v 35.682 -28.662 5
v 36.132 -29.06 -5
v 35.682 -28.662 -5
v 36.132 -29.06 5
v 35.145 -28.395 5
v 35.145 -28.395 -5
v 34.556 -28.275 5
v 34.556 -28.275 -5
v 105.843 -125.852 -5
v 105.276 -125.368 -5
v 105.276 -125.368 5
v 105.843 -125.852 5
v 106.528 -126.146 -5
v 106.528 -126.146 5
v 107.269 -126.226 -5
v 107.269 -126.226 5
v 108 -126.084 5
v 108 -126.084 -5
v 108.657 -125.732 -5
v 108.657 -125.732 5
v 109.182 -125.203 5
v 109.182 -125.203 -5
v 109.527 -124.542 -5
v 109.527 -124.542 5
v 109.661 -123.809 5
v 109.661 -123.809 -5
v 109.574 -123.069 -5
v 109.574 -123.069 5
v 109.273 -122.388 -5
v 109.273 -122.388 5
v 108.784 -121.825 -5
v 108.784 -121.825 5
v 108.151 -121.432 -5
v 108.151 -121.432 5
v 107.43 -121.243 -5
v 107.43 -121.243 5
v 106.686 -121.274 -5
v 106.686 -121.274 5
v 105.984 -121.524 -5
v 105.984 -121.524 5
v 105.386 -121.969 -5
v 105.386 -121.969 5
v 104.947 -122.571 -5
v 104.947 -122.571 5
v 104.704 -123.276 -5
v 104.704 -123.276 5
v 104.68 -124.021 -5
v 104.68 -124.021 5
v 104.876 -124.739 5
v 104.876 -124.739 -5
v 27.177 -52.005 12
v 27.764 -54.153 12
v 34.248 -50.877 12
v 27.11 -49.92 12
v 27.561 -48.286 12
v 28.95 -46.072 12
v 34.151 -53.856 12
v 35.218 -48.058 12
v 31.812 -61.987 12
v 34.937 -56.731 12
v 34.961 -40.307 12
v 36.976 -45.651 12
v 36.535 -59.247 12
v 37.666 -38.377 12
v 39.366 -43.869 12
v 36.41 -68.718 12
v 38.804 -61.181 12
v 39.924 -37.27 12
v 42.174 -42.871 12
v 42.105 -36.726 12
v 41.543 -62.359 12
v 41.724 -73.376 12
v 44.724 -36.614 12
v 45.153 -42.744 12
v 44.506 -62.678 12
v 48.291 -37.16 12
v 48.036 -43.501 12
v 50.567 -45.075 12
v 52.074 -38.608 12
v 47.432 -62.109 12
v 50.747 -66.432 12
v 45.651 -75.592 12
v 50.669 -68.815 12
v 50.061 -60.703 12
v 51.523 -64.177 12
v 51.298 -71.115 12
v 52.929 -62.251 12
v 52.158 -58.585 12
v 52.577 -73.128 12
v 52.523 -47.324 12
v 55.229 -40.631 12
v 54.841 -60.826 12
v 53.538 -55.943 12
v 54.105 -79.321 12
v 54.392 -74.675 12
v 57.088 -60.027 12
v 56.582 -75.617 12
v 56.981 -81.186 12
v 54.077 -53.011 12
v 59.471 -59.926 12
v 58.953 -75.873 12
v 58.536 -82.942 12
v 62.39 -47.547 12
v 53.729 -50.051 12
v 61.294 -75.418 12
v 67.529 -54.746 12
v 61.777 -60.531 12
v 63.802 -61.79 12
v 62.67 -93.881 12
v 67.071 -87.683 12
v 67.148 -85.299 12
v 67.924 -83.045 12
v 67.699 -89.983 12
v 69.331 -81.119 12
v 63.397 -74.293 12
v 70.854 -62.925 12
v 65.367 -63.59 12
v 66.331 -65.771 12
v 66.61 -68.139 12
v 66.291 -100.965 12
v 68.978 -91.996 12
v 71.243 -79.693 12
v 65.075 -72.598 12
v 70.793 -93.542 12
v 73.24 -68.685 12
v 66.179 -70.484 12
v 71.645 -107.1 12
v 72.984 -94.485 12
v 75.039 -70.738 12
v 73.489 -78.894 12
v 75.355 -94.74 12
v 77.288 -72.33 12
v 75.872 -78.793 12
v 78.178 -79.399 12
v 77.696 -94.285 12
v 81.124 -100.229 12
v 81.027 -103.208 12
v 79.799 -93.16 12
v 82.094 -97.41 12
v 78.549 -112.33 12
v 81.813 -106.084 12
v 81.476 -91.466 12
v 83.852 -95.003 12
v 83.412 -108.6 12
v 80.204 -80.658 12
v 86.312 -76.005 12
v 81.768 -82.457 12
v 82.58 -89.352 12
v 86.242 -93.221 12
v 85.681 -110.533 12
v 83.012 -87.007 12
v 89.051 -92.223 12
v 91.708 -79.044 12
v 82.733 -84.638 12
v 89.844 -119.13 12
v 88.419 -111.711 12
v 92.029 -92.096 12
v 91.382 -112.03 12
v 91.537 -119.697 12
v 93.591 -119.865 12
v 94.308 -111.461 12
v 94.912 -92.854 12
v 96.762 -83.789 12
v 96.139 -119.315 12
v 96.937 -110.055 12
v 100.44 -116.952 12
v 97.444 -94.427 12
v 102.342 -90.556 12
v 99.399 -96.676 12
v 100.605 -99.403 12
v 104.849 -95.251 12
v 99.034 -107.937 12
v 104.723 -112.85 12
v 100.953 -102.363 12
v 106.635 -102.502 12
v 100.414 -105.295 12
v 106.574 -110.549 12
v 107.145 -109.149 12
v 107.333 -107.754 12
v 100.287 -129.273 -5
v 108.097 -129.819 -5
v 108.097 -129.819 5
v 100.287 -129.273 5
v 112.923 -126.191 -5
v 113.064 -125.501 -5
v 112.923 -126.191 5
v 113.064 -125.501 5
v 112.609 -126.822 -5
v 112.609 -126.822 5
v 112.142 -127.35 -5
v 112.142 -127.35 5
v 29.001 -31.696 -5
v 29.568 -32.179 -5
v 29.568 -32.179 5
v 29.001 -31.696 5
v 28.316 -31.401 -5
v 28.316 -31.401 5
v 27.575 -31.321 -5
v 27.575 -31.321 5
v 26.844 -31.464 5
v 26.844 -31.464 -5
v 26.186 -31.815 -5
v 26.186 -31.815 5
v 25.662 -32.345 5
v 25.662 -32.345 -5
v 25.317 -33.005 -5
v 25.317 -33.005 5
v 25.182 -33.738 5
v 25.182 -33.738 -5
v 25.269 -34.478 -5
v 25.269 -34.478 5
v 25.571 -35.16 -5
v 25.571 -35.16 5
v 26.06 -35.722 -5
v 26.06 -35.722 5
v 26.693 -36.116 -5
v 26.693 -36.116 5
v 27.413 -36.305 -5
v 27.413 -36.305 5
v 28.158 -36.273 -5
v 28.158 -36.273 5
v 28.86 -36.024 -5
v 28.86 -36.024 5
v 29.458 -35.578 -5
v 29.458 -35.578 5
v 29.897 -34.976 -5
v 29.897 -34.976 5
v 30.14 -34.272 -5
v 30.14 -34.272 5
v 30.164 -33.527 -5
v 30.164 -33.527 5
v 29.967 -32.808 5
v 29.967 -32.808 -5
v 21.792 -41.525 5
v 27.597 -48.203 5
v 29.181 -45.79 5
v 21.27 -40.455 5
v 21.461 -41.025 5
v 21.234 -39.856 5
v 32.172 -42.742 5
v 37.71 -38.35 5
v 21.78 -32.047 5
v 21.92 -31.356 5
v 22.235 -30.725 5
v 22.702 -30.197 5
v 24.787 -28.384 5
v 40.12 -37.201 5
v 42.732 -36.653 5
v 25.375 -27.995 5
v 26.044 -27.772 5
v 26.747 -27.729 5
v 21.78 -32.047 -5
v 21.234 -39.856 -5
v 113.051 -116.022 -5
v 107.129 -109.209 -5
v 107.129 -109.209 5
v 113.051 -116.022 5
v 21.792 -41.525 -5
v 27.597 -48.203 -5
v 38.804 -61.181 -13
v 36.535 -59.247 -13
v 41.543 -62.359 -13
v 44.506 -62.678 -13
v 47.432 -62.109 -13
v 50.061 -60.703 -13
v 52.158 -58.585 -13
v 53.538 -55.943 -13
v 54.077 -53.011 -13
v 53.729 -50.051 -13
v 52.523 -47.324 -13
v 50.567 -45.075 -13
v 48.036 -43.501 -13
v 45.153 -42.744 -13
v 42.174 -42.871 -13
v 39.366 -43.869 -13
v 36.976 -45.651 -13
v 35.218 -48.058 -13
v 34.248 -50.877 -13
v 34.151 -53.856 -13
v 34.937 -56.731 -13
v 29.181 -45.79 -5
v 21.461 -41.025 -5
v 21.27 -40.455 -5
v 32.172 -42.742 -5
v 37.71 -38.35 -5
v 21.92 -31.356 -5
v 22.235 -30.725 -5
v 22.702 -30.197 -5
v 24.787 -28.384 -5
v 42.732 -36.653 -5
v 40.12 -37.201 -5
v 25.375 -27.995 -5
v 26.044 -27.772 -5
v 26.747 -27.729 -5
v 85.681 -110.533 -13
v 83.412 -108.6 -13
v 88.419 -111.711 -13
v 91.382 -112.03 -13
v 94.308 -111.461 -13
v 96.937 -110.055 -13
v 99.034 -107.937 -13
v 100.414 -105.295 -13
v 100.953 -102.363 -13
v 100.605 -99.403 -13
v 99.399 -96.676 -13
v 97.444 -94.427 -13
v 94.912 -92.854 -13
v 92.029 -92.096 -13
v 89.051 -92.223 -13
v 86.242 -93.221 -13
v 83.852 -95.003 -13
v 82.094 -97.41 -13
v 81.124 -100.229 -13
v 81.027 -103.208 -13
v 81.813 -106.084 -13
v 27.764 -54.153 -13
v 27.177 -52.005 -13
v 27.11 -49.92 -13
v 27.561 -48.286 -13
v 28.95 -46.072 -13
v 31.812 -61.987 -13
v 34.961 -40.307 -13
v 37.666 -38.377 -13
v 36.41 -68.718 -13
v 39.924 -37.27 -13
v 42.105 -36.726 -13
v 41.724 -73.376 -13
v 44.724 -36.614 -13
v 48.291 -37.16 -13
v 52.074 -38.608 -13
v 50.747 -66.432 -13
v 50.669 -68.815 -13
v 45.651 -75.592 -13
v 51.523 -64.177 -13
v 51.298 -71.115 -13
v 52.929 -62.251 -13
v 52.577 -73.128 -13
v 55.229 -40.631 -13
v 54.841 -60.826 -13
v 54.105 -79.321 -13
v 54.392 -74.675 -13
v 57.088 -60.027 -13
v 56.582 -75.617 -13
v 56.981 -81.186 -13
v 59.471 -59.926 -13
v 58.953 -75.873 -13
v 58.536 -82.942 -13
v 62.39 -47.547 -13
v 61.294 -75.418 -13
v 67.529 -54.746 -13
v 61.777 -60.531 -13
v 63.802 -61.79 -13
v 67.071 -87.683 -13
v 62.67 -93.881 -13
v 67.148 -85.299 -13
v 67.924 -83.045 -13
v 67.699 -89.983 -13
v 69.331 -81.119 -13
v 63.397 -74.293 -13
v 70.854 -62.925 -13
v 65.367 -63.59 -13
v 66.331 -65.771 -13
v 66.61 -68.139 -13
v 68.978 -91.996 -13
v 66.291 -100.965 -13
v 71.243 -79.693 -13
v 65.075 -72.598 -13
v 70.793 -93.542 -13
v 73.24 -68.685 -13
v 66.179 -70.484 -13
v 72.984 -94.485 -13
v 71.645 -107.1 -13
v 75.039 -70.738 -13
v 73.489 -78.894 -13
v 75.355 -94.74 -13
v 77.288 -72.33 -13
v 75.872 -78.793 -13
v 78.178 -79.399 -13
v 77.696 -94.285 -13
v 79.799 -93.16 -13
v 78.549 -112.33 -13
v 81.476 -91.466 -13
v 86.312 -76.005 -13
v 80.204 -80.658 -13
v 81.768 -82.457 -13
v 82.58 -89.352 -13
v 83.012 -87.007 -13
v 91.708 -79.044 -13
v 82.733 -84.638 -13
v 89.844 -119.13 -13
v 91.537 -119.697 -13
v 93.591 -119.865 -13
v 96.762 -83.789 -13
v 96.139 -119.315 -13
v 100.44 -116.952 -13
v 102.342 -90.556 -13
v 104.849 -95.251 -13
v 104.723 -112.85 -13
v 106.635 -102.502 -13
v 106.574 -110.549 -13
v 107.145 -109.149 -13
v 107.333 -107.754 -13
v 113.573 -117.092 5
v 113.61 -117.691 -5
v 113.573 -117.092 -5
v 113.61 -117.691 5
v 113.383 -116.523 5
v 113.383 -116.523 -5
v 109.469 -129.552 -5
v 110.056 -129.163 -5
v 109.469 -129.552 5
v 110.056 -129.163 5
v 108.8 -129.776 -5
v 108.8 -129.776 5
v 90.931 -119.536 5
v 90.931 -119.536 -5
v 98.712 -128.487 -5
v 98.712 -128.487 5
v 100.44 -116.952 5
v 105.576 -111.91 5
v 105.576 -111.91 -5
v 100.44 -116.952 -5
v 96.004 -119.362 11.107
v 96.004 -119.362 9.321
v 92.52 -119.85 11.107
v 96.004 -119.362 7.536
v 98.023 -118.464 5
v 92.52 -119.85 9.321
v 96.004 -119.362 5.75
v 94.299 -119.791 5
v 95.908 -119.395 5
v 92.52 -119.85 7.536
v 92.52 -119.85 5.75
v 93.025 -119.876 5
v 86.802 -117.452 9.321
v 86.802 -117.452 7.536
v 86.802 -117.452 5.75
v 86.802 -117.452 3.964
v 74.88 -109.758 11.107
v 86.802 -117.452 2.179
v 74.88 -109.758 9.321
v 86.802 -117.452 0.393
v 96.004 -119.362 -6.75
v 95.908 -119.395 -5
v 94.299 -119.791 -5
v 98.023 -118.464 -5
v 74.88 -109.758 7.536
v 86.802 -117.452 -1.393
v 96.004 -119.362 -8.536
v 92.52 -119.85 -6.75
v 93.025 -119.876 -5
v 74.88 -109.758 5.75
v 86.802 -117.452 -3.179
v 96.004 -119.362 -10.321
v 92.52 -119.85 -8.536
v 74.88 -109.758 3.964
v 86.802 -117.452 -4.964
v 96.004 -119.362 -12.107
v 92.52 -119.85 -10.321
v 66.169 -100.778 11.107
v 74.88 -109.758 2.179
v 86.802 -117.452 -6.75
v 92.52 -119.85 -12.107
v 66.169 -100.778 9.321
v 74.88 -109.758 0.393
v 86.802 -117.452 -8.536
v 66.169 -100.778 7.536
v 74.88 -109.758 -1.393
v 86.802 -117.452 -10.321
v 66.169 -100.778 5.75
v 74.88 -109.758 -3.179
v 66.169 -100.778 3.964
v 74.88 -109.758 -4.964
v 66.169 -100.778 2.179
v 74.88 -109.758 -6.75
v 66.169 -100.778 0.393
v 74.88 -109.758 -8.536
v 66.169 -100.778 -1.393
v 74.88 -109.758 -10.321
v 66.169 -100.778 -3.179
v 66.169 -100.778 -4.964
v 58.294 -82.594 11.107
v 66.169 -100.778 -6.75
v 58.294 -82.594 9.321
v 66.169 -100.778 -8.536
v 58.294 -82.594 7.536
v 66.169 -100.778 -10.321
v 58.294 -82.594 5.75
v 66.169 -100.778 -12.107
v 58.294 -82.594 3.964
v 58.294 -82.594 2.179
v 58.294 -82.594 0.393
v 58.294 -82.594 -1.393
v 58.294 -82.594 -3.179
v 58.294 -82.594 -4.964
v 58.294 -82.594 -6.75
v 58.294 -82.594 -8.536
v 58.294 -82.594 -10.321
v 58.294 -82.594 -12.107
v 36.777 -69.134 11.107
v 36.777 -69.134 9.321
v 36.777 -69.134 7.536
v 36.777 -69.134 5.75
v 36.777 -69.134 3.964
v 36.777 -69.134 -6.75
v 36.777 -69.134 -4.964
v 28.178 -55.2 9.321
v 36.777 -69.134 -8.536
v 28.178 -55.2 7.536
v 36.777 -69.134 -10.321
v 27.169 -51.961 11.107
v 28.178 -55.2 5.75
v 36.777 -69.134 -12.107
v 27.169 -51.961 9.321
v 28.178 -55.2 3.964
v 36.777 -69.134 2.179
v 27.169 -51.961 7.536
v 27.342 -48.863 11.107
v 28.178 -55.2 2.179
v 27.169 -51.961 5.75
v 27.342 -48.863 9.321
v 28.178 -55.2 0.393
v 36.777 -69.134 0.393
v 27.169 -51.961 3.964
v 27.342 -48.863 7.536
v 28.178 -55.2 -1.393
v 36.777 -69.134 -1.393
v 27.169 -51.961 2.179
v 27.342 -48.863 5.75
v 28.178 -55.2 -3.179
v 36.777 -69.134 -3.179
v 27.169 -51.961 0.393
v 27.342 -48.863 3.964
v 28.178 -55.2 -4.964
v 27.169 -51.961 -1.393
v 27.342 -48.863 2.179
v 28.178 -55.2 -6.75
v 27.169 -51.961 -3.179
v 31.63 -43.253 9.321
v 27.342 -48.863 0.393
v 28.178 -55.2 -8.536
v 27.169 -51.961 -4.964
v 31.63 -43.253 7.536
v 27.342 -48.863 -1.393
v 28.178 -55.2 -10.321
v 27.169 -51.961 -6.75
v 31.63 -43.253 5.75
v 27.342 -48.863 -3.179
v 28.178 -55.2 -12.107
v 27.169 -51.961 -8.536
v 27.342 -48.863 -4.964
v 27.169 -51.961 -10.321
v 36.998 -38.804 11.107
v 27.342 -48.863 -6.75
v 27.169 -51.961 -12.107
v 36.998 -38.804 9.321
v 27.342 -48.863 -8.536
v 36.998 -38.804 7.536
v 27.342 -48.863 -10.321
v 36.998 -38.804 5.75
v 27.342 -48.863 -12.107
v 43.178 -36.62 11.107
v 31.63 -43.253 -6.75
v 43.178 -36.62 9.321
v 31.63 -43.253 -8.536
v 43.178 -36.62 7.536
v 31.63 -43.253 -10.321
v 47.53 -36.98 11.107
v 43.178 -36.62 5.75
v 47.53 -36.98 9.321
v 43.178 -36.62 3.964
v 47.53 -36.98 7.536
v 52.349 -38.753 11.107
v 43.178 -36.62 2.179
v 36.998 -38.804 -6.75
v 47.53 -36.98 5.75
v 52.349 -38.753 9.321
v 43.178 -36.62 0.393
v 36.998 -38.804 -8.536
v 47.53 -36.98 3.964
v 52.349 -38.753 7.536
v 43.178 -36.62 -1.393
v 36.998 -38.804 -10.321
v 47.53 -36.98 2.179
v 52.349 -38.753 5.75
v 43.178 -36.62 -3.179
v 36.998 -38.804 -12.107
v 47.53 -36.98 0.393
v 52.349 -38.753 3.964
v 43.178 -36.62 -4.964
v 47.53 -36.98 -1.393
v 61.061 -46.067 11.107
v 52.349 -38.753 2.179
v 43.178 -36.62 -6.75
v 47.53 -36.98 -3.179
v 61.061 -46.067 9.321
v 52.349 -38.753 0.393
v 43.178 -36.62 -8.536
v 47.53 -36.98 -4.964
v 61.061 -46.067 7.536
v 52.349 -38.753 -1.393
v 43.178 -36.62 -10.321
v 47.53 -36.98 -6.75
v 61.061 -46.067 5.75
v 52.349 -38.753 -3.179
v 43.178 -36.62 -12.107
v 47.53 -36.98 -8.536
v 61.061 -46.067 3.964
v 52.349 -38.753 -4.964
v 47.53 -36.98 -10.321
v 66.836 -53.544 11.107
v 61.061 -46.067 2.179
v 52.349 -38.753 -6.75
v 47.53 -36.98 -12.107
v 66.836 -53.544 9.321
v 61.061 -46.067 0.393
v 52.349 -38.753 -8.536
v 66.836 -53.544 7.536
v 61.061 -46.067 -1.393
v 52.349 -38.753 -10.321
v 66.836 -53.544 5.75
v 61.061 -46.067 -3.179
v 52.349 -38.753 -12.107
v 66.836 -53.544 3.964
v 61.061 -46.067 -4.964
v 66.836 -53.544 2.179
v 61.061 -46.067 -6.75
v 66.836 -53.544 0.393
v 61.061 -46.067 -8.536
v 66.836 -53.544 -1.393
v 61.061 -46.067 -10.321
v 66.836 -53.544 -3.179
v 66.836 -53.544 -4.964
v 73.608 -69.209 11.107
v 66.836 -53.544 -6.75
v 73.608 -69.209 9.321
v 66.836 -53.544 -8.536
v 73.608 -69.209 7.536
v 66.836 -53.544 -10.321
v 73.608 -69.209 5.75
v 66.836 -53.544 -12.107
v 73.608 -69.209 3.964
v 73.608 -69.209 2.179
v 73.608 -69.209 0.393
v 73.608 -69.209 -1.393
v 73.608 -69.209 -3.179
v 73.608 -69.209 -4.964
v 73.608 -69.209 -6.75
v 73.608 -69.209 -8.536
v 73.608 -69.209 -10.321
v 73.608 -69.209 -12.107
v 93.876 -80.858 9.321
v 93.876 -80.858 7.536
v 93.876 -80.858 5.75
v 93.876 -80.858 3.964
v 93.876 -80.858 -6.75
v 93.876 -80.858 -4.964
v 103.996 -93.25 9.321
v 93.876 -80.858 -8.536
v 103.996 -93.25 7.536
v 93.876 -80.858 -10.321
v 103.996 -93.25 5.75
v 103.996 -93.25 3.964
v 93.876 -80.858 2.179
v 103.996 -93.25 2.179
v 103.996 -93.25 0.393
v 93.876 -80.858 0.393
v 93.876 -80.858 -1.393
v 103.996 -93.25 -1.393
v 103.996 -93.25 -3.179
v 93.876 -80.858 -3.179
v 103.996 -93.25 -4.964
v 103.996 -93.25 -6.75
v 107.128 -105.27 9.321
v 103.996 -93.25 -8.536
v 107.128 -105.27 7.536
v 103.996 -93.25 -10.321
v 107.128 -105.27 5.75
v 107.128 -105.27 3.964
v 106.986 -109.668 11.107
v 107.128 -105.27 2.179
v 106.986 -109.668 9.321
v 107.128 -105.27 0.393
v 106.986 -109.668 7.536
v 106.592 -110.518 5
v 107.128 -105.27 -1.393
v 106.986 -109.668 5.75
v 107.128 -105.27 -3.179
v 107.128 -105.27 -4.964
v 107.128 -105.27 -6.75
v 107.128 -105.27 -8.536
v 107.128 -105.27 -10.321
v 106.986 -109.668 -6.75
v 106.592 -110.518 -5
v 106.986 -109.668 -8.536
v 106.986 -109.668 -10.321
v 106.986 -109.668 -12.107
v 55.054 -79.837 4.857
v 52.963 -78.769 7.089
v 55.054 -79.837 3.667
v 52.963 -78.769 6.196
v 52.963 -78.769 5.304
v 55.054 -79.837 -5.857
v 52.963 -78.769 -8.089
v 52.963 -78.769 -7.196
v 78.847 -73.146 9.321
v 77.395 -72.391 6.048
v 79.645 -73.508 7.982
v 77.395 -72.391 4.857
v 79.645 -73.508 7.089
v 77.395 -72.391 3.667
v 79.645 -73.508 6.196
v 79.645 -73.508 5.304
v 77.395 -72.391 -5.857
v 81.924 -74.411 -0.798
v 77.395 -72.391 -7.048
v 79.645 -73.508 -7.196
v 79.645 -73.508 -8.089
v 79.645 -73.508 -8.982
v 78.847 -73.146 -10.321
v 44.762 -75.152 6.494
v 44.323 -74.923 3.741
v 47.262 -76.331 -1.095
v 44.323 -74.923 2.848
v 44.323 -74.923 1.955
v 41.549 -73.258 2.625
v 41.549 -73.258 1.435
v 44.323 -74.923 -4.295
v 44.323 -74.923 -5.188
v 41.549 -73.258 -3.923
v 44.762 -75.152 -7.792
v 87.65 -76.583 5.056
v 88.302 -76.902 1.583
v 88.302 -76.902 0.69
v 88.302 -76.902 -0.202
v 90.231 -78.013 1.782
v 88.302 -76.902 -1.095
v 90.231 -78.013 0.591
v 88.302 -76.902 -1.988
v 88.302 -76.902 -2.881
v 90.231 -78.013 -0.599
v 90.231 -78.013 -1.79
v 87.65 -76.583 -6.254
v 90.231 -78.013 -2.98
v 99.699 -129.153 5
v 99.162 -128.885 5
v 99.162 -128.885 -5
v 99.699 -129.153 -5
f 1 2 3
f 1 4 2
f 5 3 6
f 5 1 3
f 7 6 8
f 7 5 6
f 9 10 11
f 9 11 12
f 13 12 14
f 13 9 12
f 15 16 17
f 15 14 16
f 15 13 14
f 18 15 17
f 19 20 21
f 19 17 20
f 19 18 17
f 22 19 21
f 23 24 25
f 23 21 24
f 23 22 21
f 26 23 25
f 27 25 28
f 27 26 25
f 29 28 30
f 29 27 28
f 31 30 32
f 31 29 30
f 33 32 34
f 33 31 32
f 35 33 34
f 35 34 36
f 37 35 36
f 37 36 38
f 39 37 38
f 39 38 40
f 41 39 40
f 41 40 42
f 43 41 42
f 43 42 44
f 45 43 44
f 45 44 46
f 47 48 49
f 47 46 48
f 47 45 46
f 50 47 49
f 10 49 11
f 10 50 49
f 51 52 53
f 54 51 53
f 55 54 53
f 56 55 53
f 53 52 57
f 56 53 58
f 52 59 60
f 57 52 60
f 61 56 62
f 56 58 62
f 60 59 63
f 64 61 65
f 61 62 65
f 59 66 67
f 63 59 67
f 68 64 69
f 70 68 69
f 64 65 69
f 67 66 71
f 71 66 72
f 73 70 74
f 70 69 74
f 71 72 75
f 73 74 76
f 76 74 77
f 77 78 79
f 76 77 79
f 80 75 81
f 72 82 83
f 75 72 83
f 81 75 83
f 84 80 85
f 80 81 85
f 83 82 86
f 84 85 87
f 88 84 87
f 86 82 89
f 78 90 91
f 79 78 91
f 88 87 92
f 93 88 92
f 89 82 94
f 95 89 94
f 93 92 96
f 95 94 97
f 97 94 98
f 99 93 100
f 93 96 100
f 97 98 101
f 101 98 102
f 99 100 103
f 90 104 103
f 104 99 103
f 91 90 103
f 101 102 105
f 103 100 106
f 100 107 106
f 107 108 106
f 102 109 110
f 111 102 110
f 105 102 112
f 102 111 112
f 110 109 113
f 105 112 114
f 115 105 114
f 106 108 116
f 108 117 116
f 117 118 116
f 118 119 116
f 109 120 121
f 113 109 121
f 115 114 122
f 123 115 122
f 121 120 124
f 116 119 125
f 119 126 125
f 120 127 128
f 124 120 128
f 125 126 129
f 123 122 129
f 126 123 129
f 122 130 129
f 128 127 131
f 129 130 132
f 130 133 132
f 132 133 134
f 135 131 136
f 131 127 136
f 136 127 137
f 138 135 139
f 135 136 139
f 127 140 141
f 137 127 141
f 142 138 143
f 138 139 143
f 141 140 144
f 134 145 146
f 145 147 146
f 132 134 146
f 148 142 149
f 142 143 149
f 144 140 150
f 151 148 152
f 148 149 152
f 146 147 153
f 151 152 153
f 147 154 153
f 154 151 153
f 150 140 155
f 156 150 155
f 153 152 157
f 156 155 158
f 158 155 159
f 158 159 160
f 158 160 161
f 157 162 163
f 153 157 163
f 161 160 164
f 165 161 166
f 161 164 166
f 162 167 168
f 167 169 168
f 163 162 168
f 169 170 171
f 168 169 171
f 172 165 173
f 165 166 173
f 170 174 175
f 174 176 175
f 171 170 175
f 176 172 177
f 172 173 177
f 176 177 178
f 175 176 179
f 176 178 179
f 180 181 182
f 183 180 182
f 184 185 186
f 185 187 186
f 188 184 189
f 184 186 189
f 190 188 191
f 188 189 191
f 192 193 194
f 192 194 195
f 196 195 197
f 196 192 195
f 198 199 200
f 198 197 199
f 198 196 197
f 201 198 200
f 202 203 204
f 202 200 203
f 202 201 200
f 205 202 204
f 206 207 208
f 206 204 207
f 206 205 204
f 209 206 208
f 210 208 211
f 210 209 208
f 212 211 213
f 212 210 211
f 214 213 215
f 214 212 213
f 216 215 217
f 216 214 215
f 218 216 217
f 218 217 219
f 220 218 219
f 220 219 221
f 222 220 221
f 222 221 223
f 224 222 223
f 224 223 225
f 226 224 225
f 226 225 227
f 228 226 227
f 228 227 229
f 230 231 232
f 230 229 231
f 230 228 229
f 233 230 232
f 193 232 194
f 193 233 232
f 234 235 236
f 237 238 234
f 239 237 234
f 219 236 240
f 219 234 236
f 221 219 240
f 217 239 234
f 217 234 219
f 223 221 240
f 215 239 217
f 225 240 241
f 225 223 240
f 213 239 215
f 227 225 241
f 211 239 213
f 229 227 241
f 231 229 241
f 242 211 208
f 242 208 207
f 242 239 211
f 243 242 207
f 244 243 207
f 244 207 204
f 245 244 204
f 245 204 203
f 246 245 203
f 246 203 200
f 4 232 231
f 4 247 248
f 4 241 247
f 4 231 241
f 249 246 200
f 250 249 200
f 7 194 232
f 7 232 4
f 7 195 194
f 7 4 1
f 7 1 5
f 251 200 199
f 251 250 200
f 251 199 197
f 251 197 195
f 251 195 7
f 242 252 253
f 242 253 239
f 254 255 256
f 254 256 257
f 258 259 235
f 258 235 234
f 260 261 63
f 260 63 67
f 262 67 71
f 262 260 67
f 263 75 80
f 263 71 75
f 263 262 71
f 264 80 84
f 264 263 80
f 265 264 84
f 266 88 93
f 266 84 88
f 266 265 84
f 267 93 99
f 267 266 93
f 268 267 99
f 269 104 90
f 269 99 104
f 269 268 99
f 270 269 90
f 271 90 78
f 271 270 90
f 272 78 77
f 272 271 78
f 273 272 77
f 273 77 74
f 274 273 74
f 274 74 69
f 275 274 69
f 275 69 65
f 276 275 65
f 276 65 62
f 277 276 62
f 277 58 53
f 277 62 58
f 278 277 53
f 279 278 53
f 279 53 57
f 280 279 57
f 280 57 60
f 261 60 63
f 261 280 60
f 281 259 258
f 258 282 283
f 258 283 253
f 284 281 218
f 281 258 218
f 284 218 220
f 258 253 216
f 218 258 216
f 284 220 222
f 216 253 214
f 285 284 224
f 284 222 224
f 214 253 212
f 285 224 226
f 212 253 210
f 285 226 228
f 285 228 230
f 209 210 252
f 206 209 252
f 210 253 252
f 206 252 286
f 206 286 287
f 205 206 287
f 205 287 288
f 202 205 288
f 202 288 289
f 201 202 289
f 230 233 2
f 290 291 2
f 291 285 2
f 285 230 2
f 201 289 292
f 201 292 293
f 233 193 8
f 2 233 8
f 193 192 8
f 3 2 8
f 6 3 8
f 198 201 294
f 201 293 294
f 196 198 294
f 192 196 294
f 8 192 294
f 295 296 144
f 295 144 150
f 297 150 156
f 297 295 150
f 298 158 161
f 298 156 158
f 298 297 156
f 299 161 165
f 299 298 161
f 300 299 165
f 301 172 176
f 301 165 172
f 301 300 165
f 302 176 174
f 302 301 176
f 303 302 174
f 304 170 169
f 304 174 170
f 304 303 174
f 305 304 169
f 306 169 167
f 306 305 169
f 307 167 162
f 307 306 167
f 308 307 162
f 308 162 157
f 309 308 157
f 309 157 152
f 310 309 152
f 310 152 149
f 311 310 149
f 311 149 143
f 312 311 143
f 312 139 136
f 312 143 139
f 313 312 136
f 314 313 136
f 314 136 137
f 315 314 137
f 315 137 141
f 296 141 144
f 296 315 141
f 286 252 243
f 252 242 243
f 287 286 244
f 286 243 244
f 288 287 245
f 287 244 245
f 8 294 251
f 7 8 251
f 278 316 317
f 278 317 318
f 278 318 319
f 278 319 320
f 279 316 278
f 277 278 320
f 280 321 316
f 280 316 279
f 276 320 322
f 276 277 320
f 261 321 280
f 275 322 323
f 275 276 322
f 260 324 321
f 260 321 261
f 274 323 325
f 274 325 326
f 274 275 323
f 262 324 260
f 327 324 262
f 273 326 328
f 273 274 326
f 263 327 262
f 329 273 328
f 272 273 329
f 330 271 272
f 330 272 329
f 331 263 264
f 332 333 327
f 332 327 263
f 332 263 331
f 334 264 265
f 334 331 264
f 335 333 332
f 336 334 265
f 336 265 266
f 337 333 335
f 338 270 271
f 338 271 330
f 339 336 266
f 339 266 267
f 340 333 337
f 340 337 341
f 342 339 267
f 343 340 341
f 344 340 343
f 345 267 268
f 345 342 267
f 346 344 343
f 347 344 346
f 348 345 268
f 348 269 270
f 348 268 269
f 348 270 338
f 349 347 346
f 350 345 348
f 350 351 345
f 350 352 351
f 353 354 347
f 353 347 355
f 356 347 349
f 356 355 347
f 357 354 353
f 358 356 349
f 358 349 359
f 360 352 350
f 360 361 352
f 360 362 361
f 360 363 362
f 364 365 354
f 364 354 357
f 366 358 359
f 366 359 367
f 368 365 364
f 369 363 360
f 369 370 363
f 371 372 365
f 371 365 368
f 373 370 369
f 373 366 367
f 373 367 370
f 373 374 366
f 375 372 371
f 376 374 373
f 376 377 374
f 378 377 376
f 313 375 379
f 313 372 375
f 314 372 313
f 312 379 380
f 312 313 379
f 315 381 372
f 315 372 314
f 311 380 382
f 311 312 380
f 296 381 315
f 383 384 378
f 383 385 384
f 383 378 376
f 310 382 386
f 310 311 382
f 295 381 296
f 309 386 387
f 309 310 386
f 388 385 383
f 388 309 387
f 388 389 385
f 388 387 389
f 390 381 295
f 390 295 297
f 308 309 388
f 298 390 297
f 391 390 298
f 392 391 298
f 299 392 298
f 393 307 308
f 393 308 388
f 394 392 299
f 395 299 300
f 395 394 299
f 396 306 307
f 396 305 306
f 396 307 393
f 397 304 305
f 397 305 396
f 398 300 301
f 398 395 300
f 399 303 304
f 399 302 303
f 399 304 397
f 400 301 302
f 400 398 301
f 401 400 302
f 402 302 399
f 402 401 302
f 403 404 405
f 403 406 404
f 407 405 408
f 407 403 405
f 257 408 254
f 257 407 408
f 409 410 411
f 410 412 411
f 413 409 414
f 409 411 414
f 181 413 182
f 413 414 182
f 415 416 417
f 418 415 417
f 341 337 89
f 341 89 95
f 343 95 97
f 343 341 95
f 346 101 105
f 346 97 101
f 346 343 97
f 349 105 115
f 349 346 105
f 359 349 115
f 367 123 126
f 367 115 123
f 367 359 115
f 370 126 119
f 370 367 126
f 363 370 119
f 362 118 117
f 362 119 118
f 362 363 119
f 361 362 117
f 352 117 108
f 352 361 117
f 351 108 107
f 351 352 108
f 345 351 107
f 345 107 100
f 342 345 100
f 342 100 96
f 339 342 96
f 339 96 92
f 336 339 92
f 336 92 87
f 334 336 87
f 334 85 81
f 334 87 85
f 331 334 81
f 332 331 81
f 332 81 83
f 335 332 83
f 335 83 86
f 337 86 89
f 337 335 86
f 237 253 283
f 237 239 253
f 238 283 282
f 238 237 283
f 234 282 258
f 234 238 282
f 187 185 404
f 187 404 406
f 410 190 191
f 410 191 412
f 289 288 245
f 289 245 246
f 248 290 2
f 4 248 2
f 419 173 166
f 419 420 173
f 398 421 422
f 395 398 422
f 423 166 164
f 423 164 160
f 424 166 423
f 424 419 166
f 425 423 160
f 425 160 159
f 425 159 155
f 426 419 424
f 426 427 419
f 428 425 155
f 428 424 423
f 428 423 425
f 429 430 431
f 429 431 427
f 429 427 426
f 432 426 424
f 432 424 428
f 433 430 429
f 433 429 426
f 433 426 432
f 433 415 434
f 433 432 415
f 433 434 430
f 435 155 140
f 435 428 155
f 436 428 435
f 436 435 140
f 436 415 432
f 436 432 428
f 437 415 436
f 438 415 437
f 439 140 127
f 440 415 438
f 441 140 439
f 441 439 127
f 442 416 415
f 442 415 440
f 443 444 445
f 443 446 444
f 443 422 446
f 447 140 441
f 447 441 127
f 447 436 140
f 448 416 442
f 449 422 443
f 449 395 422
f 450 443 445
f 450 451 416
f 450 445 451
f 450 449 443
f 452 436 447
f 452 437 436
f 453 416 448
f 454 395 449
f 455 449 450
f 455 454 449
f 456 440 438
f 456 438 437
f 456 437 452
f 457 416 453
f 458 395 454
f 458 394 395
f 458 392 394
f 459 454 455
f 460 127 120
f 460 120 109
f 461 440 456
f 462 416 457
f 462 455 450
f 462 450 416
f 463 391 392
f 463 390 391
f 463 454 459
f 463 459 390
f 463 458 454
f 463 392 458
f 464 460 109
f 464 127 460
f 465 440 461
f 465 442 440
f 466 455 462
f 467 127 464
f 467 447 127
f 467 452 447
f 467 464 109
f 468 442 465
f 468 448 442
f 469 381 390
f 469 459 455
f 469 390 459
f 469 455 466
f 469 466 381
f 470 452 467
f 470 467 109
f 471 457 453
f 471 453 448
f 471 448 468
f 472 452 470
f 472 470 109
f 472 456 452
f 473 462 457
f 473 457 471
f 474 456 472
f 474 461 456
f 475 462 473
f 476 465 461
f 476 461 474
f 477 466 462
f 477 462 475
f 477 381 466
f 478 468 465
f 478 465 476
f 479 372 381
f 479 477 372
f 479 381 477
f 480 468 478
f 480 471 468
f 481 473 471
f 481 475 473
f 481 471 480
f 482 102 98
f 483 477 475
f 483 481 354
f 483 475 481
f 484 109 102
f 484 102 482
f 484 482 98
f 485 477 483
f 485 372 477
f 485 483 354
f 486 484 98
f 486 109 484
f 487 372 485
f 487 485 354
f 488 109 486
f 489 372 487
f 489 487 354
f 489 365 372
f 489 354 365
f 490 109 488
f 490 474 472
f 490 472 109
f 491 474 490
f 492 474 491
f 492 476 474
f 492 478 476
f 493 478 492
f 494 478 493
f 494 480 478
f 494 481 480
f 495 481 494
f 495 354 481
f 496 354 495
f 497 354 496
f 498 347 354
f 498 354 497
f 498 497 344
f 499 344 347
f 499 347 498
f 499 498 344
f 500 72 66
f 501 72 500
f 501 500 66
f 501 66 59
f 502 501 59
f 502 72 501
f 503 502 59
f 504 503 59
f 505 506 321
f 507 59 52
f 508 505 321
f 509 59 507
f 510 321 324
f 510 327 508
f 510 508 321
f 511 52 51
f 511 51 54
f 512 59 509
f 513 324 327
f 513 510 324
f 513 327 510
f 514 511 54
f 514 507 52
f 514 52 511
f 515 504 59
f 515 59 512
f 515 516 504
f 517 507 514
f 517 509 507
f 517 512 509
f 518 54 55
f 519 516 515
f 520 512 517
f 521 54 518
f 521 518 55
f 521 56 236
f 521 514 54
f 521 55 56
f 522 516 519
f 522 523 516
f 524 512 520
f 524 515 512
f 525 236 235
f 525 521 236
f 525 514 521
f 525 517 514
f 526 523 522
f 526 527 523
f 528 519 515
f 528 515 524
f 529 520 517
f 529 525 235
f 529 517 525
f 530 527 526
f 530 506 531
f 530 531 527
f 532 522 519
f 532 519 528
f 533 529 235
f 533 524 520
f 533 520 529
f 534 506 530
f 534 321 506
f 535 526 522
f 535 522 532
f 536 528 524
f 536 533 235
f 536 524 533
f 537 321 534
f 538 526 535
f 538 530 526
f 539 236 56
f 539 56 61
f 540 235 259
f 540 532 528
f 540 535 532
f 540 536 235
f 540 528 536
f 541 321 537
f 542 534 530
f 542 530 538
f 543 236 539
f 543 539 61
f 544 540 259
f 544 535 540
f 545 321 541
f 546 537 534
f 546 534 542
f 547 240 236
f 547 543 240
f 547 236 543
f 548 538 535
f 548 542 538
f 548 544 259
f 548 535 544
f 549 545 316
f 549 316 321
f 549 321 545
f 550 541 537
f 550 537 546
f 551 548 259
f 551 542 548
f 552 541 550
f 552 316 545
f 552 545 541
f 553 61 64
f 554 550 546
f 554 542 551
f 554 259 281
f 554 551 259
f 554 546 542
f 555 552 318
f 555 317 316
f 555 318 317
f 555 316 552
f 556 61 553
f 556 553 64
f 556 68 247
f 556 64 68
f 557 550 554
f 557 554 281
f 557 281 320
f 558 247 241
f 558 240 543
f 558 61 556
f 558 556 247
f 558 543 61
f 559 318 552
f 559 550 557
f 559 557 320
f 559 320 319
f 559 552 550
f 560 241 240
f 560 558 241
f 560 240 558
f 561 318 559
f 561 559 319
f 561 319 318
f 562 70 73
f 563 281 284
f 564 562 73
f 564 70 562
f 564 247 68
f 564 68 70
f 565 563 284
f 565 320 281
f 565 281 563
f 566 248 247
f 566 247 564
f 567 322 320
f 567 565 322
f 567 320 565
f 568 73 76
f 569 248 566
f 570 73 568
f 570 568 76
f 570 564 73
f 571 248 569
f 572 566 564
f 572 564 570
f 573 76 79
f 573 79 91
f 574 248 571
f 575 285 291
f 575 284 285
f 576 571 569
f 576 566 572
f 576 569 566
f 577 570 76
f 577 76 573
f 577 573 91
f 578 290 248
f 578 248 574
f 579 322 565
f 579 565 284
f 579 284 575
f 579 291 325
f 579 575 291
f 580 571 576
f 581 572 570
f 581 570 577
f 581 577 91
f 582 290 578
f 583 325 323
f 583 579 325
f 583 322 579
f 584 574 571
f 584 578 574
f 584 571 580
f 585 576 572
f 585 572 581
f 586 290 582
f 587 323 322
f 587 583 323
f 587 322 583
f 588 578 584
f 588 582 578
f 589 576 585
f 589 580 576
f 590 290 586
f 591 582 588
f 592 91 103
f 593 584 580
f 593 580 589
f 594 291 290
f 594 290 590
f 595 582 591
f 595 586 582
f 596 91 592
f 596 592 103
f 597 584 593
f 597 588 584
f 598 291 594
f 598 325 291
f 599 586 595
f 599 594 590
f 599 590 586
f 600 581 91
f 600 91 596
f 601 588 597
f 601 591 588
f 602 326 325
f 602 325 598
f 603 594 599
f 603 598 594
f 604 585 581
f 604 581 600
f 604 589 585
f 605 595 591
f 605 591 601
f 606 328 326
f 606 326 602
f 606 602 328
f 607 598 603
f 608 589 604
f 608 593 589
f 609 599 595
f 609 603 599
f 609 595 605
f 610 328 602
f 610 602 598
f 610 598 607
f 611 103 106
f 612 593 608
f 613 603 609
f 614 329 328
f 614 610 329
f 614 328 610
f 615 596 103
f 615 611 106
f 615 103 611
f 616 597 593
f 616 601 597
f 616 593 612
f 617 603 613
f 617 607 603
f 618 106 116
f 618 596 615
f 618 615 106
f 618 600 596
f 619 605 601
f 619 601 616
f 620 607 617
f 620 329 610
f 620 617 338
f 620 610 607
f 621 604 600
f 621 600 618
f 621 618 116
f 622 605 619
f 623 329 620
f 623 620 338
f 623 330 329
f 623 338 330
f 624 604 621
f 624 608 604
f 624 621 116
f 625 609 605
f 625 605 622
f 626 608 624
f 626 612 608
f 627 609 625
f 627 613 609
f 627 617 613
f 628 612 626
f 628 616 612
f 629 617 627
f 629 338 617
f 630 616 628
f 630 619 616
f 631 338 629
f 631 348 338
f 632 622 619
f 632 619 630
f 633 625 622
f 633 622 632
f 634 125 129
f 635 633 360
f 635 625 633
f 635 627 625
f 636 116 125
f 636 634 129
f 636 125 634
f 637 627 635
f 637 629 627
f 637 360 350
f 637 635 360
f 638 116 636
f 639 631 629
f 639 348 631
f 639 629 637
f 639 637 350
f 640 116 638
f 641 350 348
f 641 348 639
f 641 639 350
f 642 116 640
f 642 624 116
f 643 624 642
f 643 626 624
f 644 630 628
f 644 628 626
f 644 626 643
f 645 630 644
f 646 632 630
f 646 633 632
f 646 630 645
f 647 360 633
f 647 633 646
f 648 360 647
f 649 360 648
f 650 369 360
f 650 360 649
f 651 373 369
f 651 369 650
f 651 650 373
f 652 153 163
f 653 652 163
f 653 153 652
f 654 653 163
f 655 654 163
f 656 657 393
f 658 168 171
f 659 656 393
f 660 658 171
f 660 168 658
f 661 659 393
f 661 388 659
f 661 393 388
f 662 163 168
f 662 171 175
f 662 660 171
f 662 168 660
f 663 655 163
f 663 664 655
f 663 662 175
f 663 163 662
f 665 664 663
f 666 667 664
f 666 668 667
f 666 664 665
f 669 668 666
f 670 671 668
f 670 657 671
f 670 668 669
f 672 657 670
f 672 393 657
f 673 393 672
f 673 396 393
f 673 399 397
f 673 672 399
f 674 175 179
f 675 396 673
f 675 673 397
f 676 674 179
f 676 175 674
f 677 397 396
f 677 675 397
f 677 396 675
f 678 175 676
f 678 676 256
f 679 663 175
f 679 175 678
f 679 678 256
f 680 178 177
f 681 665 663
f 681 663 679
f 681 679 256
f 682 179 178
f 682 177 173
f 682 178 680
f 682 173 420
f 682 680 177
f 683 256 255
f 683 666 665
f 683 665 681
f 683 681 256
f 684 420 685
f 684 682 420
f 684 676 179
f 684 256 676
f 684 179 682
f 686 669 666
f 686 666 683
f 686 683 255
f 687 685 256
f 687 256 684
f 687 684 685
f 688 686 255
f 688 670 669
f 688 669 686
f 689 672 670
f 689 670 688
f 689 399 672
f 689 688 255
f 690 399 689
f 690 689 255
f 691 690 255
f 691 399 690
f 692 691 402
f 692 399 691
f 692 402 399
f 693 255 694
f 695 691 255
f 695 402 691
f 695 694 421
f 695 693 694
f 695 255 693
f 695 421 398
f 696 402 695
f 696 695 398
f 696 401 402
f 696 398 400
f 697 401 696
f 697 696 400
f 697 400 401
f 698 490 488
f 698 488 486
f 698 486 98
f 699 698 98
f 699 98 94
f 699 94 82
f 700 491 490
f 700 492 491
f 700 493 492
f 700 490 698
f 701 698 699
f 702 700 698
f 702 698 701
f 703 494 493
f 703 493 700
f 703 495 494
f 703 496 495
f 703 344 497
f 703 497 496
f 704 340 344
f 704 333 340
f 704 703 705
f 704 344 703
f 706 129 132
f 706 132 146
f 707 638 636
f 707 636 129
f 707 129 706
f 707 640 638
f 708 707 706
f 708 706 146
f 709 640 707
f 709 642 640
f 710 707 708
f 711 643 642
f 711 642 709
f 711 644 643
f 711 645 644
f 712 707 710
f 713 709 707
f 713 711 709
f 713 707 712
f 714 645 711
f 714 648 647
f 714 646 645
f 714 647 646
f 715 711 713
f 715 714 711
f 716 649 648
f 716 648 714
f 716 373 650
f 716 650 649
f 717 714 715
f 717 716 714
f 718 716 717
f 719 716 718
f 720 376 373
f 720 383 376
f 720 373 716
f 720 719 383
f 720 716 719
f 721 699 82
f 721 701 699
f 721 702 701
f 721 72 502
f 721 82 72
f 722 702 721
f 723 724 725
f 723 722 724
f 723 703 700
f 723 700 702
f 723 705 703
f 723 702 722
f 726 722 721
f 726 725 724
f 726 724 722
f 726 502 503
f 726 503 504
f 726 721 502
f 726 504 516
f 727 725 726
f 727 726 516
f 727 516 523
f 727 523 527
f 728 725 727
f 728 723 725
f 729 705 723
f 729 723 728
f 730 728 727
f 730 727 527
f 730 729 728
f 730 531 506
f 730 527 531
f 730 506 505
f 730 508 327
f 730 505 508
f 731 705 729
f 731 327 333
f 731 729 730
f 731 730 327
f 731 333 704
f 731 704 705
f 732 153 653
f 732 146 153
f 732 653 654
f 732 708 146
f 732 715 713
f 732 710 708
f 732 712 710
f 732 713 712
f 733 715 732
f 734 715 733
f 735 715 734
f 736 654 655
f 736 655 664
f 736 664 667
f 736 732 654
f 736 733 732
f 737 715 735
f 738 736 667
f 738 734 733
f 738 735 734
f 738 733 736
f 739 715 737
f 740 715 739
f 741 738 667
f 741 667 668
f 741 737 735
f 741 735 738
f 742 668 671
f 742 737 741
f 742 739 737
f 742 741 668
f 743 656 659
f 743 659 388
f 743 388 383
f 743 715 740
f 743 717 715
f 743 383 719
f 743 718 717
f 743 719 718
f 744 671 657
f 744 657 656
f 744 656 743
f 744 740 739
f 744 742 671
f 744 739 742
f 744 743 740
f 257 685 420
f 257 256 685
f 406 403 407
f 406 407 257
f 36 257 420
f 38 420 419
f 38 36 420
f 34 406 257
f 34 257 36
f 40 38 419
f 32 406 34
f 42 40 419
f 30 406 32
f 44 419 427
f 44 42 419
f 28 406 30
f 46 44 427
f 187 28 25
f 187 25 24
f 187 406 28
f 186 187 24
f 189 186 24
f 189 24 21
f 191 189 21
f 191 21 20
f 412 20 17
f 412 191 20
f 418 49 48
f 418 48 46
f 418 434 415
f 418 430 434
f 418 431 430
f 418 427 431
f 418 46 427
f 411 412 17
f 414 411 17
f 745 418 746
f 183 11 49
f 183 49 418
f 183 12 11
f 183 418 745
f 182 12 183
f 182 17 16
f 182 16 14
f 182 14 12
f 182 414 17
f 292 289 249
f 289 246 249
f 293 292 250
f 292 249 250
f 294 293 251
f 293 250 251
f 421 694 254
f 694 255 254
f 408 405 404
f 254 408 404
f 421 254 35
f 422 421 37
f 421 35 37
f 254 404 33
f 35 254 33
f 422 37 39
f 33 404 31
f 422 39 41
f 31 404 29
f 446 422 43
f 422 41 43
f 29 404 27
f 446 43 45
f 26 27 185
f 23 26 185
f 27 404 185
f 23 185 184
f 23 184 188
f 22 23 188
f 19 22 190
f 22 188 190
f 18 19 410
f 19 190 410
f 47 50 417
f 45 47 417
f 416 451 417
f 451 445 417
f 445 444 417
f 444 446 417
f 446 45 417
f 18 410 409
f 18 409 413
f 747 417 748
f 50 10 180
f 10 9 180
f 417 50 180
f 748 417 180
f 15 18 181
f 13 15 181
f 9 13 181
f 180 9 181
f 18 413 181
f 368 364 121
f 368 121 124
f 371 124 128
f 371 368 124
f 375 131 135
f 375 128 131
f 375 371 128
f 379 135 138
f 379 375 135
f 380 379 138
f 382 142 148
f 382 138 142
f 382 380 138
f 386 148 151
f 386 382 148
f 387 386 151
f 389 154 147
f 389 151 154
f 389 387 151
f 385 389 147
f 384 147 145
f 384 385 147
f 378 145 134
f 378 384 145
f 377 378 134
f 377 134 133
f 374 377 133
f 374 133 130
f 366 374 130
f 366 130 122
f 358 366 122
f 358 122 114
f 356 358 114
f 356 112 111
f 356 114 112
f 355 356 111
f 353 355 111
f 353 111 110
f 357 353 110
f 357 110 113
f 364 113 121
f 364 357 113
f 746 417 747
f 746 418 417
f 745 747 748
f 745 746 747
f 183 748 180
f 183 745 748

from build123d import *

# Parameters (mm, degrees)
CYLINDER034_R             = 8
CYLINDER034_DEPTH         = 36
CYLINDER035_R             = 8
CYLINDER035_DEPTH         = 36
CYLINDER036_R             = 10
CYLINDER036_DEPTH         = 36
CYLINDER033_R             = 10
CYLINDER033_DEPTH         = 36
CYLINDER031_R             = 2.5
CYLINDER031_DEPTH         = 26
BOX011_W                  = 19
BOX011_H                  = 21
BOX011_DEPTH              = 10
CHAMFER002_SIZE           = 7
FILLET002_R               = 2.7
FILLET003_R               = 2.3
EXTRUDE001_DEPTH          = 25
CYLINDER032_R             = 2.5
CYLINDER032_DEPTH         = 26
BOX012_W                  = 19
BOX012_H                  = 21
BOX012_DEPTH              = 10
CHAMFER003_SIZE           = 7
FILLET005_R               = 2.7
FILLET004_R               = 2.3
FILLET004_PLACEMENT_ANGLE = 180
CUT033_PLACEMENT_ANGLE    = 221


with BuildPart() as cylinder034:
    # Cylinder034 → Cylinder034 (new body)
    with BuildSketch(Plane(origin=(15, -126, -17), x_dir=(1, 0, 0), z_dir=(0, 0, 1))):
        Circle(CYLINDER034_R)
    extrude(amount=CYLINDER034_DEPTH)


with BuildPart() as cylinder035:
    # Cylinder035 → Cylinder035 (new body)
    with BuildSketch(Plane(origin=(15, -151, -17), x_dir=(1, 0, 0), z_dir=(0, 0, 1))):
        Circle(CYLINDER035_R)
    extrude(amount=CYLINDER035_DEPTH)


with BuildPart() as cylinder036:
    # Cylinder036 → Cylinder036 (new body)
    with BuildSketch(Plane(origin=(16, -172, -17), x_dir=(1, 0, 0), z_dir=(0, 0, 1))):
        Circle(CYLINDER036_R)
    extrude(amount=CYLINDER036_DEPTH)


with BuildPart() as cylinder033:
    # Cylinder033 → Cylinder033 (new body)
    with BuildSketch(Plane(origin=(13, -104, -17), x_dir=(1, 0, 0), z_dir=(0, 0, 1))):
        Circle(CYLINDER033_R)
    extrude(amount=CYLINDER033_DEPTH)


with BuildPart() as cylinder031:
    # Cylinder031 → Cylinder031 (new body)
    with BuildSketch(Plane(origin=(15, -77, -13), x_dir=(1, 0, 0), z_dir=(0, 0, 1))):
        Circle(CYLINDER031_R)
    extrude(amount=CYLINDER031_DEPTH)


with BuildPart() as fillet003:
    # Box011 → Box011 (new body)
    with BuildSketch(Plane(origin=(6, -92, -5), x_dir=(1, 0, 0), z_dir=(0, 0, 1))):
        with Locations((9.5, 10.5)):
            Rectangle(BOX011_W, BOX011_H)
    extrude(amount=BOX011_DEPTH)

    # Chamfer002
    chamfer002_edges = [fillet003.edges().sort_by_distance(p)[0] for p in [
        (6, -71, 0),
        (25, -71, 0),
    ]]
    chamfer(chamfer002_edges, length=CHAMFER002_SIZE)

    # Fillet002
    fillet002_edges = [fillet003.edges().sort_by_distance(p)[0] for p in [
        (13, -71, 0),
        (18, -71, 0),
    ]]
    fillet(fillet002_edges, radius=FILLET002_R)


with BuildPart() as fillet003_1:
    # Fillet002 placement: moved
    add(fillet003.part.moved(Location((-0.5, 0, 0))))

    # Cut028: cut Cylinder031
    add(cylinder031.part, mode=Mode.SUBTRACT)

    # Fillet003
    fillet003_edges = [fillet003_1.edges().sort_by_distance(p)[0] for p in [
        (5.5, -78, 0),
        (24.5, -78, 0),
    ]]
    fillet(fillet003_edges, radius=FILLET003_R)


with BuildPart() as extrude001:
    # Sketch001 → Extrude001 (new body)
    with BuildSketch(Plane.XY):
        with BuildLine():
            add(Edge.make_bspline(
                [(15.628, -86.5245), (23.8291, -87.3446), (25.9614, -94.3976), (30.8821, -109.16), (31.7022, -121.297), (27.6017, -132.943), (23.8291, -140.16), (26.4535, -147.049), (31.0461, -155.414), (32.8504, -164.435), (31.3742, -173.129), (29.898, -180.838), (26.9456, -186.743), (19.0724, -187.399), (12.0195, -187.399), (6.27866, -185.758), (-0.282263, -177.885), (-1.43043, -165.256), (-0.938356, -156.234), (1.52199, -148.361), (5.78659, -140.16), (2.67015, -131.959), (-1.59445, -125.562), (-3.3987, -118.345), (-3.3987, -109.488), (-3.07065, -101.779), (0.045788, -95.8738), (2.99821, -90.6251), (5.45855, -87.3446), (8.90302, -86.6885), (15.628, -86.5245)],
                knots=[0, 0, 0, 0, 0.035714, 0.071429, 0.107143, 0.142857, 0.178571, 0.214286, 0.25, 0.285714, 0.321429, 0.357143, 0.392857, 0.428571, 0.464286, 0.5, 0.535714, 0.571429, 0.607143, 0.642857, 0.678571, 0.714286, 0.75, 0.785714, 0.821429, 0.857143, 0.892857, 0.928571, 0.964286, 1, 1, 1, 1], degree=3))
        make_face()
    extrude(amount=EXTRUDE001_DEPTH)


with BuildPart() as extrude001_1:
    # Extrude001 placement: moved
    add(extrude001.part.moved(Location((0, 0, -13))))


with BuildPart() as cylinder032:
    # Cylinder032 → Cylinder032 (new body)
    with BuildSketch(Plane(origin=(15, -77, -13), x_dir=(1, 0, 0), z_dir=(0, 0, 1))):
        Circle(CYLINDER032_R)
    extrude(amount=CYLINDER032_DEPTH)


with BuildPart() as cut033:
    # Box012 → Box012 (new body)
    with BuildSketch(Plane(origin=(6, -92, -5), x_dir=(1, 0, 0), z_dir=(0, 0, 1))):
        with Locations((9.5, 10.5)):
            Rectangle(BOX012_W, BOX012_H)
    extrude(amount=BOX012_DEPTH)

    # Chamfer003
    chamfer003_edges = [cut033.edges().sort_by_distance(p)[0] for p in [
        (6, -71, 0),
        (25, -71, 0),
    ]]
    chamfer(chamfer003_edges, length=CHAMFER003_SIZE)

    # Fillet005
    fillet005_edges = [cut033.edges().sort_by_distance(p)[0] for p in [
        (13, -71, 0),
        (18, -71, 0),
    ]]
    fillet(fillet005_edges, radius=FILLET005_R)


with BuildPart() as cut033_1:
    # Fillet005 placement: moved
    add(cut033.part.moved(Location((-0.5, 0, 0))))

    # Cut029: cut Cylinder032
    add(cylinder032.part, mode=Mode.SUBTRACT)

    # Fillet004
    fillet004_edges = [cut033_1.edges().sort_by_distance(p)[0] for p in [
        (5.5, -78, 0),
        (24.5, -78, 0),
    ]]
    fillet(fillet004_edges, radius=FILLET004_R)


with BuildPart() as cut033_2:
    # Fillet004 placement: moved
    add(cut033_1.part.moved(Location((31, -274, 0))).rotate(Axis((31, -274, 0), (0, 0, 1)), FILLET004_PLACEMENT_ANGLE))

    # Fusion015: union Fillet003, Extrude001
    add(fillet003_1.part)
    add(extrude001_1.part)

    # Cut030: cut Cylinder033
    add(cylinder033.part, mode=Mode.SUBTRACT)

    # Cut031: cut Cylinder036
    add(cylinder036.part, mode=Mode.SUBTRACT)

    # Cut032: cut Cylinder035
    add(cylinder035.part, mode=Mode.SUBTRACT)

    # Cut033: cut Cylinder034
    add(cylinder034.part, mode=Mode.SUBTRACT)


with BuildPart() as cut033_3:
    # Cut033 placement: moved
    add(cut033_2.part.moved(Location((169, -172, 0))).rotate(Axis((169, -172, 0), (0, 0, 1)), CUT033_PLACEMENT_ANGLE))


solid = cut033_3.part
